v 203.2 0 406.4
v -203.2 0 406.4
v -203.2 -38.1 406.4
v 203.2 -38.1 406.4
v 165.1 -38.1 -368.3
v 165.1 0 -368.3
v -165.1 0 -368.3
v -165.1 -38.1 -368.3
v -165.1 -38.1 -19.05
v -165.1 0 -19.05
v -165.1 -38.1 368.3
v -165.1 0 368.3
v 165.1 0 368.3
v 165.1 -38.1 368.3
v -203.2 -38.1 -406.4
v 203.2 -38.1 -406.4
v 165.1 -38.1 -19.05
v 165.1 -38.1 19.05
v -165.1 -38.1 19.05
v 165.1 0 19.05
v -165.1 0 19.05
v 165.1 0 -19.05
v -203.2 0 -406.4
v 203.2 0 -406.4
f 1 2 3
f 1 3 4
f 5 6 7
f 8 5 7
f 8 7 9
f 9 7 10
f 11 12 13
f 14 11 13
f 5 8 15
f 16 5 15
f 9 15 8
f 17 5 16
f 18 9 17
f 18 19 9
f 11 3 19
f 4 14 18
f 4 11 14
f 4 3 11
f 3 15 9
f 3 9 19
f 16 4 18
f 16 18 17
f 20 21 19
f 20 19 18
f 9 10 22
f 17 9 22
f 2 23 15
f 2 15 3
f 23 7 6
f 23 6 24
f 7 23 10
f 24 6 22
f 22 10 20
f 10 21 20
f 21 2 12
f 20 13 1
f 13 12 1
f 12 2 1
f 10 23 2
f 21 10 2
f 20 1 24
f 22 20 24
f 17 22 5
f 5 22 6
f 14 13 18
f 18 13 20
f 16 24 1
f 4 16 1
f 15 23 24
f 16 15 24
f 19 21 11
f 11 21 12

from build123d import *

# Parameters (mm, degrees)
F0_W     = 406.4
F0_H     = 812.8
F0_W_2   = 330.2
F0_H_2   = 38.1
F1_DEPTH = 38.1


with BuildPart() as f1:
    # F0 (on Front) → F1 (new body)
    with BuildSketch(Plane.XZ):
        Rectangle(F0_W, F0_H)
        Polygon((165.1, -19.05), (165.1, -368.3), (-165.1, -368.3), (-165.1, -19.05), (-165.1, 19.05), (-165.1, 368.3), (165.1, 368.3), (165.1, 19.05), align=None, mode=Mode.SUBTRACT)
        Rectangle(F0_W_2, F0_H_2)
    extrude(amount=F1_DEPTH)


solid = f1.part
